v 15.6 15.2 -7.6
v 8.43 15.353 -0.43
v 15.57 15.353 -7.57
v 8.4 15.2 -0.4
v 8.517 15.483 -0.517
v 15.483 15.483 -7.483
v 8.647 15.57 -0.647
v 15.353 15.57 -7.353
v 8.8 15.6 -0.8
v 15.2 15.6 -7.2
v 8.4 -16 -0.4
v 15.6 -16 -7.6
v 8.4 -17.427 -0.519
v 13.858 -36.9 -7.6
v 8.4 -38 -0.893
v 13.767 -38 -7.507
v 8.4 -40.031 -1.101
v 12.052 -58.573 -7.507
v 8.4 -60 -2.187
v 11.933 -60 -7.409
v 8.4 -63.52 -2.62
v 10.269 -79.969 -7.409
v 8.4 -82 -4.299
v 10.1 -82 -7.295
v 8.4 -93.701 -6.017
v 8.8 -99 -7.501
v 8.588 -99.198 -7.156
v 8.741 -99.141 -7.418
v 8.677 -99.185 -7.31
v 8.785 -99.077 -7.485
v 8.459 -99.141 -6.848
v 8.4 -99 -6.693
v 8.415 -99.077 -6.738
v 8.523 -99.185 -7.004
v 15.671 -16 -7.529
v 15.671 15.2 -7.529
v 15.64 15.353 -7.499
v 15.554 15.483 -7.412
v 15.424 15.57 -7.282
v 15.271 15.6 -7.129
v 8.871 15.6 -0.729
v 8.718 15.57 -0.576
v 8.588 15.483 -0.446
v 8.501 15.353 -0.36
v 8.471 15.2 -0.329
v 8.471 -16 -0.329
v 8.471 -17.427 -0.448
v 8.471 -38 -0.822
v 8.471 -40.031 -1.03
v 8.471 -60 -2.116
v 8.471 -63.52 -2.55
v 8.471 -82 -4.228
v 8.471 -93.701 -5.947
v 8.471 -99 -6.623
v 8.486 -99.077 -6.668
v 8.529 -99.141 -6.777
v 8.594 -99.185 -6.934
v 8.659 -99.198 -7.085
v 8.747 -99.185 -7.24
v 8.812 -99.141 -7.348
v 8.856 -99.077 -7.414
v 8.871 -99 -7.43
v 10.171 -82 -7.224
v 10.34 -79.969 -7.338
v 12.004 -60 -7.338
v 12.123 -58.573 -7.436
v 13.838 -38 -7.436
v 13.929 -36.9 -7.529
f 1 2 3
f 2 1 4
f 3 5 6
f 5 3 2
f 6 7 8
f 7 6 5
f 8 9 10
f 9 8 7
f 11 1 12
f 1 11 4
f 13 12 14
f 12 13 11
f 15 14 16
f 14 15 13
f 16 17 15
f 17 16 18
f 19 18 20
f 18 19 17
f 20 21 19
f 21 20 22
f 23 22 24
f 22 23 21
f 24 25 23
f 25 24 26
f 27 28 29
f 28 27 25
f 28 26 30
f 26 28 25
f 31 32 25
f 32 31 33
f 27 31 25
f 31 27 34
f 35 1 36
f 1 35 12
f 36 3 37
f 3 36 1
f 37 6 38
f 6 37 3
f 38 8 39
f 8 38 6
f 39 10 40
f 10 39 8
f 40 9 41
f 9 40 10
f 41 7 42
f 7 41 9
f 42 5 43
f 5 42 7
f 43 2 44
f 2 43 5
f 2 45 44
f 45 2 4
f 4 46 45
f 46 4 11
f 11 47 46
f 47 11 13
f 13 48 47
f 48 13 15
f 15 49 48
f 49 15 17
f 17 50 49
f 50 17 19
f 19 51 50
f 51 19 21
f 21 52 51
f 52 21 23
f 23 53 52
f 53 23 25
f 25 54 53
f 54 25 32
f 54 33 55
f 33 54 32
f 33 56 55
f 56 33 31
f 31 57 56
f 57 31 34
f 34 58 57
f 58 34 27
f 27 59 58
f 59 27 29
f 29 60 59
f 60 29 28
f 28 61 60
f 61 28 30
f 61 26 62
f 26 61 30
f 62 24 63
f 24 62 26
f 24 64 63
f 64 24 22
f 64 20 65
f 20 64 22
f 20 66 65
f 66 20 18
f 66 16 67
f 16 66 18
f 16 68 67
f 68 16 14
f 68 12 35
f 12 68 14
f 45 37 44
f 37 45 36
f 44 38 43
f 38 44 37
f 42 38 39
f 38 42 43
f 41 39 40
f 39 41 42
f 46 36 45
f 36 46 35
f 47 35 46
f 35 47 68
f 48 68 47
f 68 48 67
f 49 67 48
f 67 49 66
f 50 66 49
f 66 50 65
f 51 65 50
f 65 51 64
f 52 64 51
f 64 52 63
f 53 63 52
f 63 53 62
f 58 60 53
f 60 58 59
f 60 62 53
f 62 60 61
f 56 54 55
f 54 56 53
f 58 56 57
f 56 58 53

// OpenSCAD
use <../lib.scad>
function ldraw_lib__6347356qc01() = [
// 0 Sticker  1.1 x 14.1 Triangular Left Dark Red (Formed)
// 0 Name: 6347356qc01.dat
// 0 Author: Evert-Jan Boer [ejboer]
// 0 !LDRAW_ORG Part UPDATE 2025-08
// 0 !LICENSE Licensed under CC BY 4.0 : see CAreadme.txt
// 
// 0 BFC CERTIFY CCW
  [0,"BFC","CERTIFY"],
  [0,"BFC","CCW"],
// 
// 0 !KEYWORDS BrickLink 75309stk01, Rebrickable 78793, Republic Gunship, Set 75309
// 0 !KEYWORDS Star Wars
// 
// 0 !HISTORY 2025-08-31 [OrionP] Official Update 2025-08
// 
// 4 16 21.0761 1.0761 38.3827 38.9239 18.9239 38.3827 39 19 38 21 1 38
  [4,16,21.0761,1.0761,38.3827,38.9239,18.9239,38.3827,39,19,38,21,1,38],
// 4 16 21.0761 1.0761 38.3827 21.2929 1.2929 38.7071 38.7071 18.7071 38.7071 38.9239 18.9239 38.3827
  [4,16,21.0761,1.0761,38.3827,21.2929,1.2929,38.7071,38.7071,18.7071,38.7071,38.9239,18.9239,38.3827],
// 4 16 38.7071 18.7071 38.7071 21.2929 1.2929 38.7071 21.6173 1.6173 38.9239 38.3827 18.3827 38.9239
  [4,16,38.7071,18.7071,38.7071,21.2929,1.2929,38.7071,21.6173,1.6173,38.9239,38.3827,18.3827,38.9239],
// 4 16 21.6173 1.6173 38.9239 22 2 39 38 18 39 38.3827 18.3827 38.9239
  [4,16,21.6173,1.6173,38.9239,22,2,39,38,18,39,38.3827,18.3827,38.9239],
// 4 16 39 19 -40 21 1 -40 21 1 38 39 19 38
  [4,16,39,19,-40,21,1,-40,21,1,38,39,19,38],
// 4 16 34.6462 19 -92.25 21 1.2973 -43.5675 21 1 -40 39 19 -40
  [4,16,34.6462,19,-92.25,21,1.2973,-43.5675,21,1,-40,39,19,-40],
// 4 16 34.417 18.7675 -95 21 2.2315 -95 21 1.2973 -43.5675 34.6462 19 -92.25
  [4,16,34.417,18.7675,-95,21,2.2315,-95,21,1.2973,-43.5675,34.6462,19,-92.25],
// 4 16 30.1303 18.7675 -146.4325 21 2.753 -100.0771 21 2.2315 -95 34.417 18.7675 -95
  [4,16,30.1303,18.7675,-146.4325,21,2.753,-100.0771,21,2.2315,-95,34.417,18.7675,-95],
// 4 16 21 2.753 -100.0771 30.1303 18.7675 -146.4325 29.833 18.522 -150 21 5.467 -150
  [4,16,21,2.753,-100.0771,30.1303,18.7675,-146.4325,29.833,18.522,-150,21,5.467,-150],
// 4 16 25.6731 18.522 -199.9229 21 6.5508 -158.8 21 5.467 -150 29.833 18.522 -150
  [4,16,25.6731,18.522,-199.9229,21,6.5508,-158.8,21,5.467,-150,29.833,18.522,-150],
// 4 16 25.25 18.2374 -205 21 10.7466 -205 21 6.5508 -158.8 25.6731 18.522 -199.9229
  [4,16,25.25,18.2374,-205,21,10.7466,-205,21,6.5508,-158.8,25.6731,18.522,-199.9229],
// 4 16 25.25 18.2374 -205 22 18.7518 -247.5 21 15.0434 -234.253 21 10.7466 -205
  [4,16,25.25,18.2374,-205,22,18.7518,-247.5,21,15.0434,-234.253,21,10.7466,-205],
// 4 16 21.8536 18.5456 -247.8536 21.6914 18.2756 -247.962 21.4697 17.8897 -247.994 21 15.0434 -234.253
  [4,16,21.8536,18.5456,-247.8536,21.6914,18.2756,-247.962,21.4697,17.8897,-247.994,21,15.0434,-234.253],
// 4 16 21.8536 18.5456 -247.8536 21 15.0434 -234.253 22 18.7518 -247.5 21.962 18.7128 -247.6913
  [4,16,21.8536,18.5456,-247.8536,21,15.0434,-234.253,22,18.7518,-247.5,21.962,18.7128,-247.6913],
// 4 16 21.1465 17.1193 -247.8536 21.0381 16.8462 -247.6913 21 16.7332 -247.5 21 15.0434 -234.253
  [4,16,21.1465,17.1193,-247.8536,21.0381,16.8462,-247.6913,21,16.7332,-247.5,21,15.0434,-234.253],
// 4 16 21.1465 17.1193 -247.8536 21 15.0434 -234.253 21.4697 17.8897 -247.994 21.3087 17.5106 -247.962
  [4,16,21.1465,17.1193,-247.8536,21,15.0434,-234.253,21.4697,17.8897,-247.994,21.3087,17.5106,-247.962],
// 4 16 39.1768 18.8232 -40 39 19 -40 39 19 38 39.1768 18.8232 38
  [4,16,39.1768,18.8232,-40,39,19,-40,39,19,38,39.1768,18.8232,38],
// 4 16 39 19 38 38.9239 18.9239 38.3827 39.1007 18.7471 38.3827 39.1768 18.8232 38
  [4,16,39,19,38,38.9239,18.9239,38.3827,39.1007,18.7471,38.3827,39.1768,18.8232,38],
// 4 16 38.9239 18.9239 38.3827 38.7071 18.7071 38.7071 38.8839 18.5303 38.7071 39.1007 18.7471 38.3827
  [4,16,38.9239,18.9239,38.3827,38.7071,18.7071,38.7071,38.8839,18.5303,38.7071,39.1007,18.7471,38.3827],
// 4 16 38.7071 18.7071 38.7071 38.3827 18.3827 38.9239 38.5595 18.2059 38.9239 38.8839 18.5303 38.7071
  [4,16,38.7071,18.7071,38.7071,38.3827,18.3827,38.9239,38.5595,18.2059,38.9239,38.8839,18.5303,38.7071],
// 4 16 38.3827 18.3827 38.9239 38 18 39 38.1768 17.8232 39 38.5595 18.2059 38.9239
  [4,16,38.3827,18.3827,38.9239,38,18,39,38.1768,17.8232,39,38.5595,18.2059,38.9239],
// 4 16 38.1768 17.8232 39 38 18 39 22 2 39 22.1768 1.8232 39
  [4,16,38.1768,17.8232,39,38,18,39,22,2,39,22.1768,1.8232,39],
// 4 16 22 2 39 21.6173 1.6173 38.9239 21.7941 1.4405 38.9239 22.1768 1.8232 39
  [4,16,22,2,39,21.6173,1.6173,38.9239,21.7941,1.4405,38.9239,22.1768,1.8232,39],
// 4 16 21.6173 1.6173 38.9239 21.2929 1.2929 38.7071 21.4697 1.1161 38.7071 21.7941 1.4405 38.9239
  [4,16,21.6173,1.6173,38.9239,21.2929,1.2929,38.7071,21.4697,1.1161,38.7071,21.7941,1.4405,38.9239],
// 4 16 21.2929 1.2929 38.7071 21.0761 1.0761 38.3827 21.2529 .8993 38.3827 21.4697 1.1161 38.7071
  [4,16,21.2929,1.2929,38.7071,21.0761,1.0761,38.3827,21.2529,.8993,38.3827,21.4697,1.1161,38.7071],
// 4 16 21.0761 1.0761 38.3827 21 1 38 21.1768 .8232 38 21.2529 .8993 38.3827
  [4,16,21.0761,1.0761,38.3827,21,1,38,21.1768,.8232,38,21.2529,.8993,38.3827],
// 4 16 21.1768 .8232 38 21 1 38 21 1 -40 21.1768 .8232 -40
  [4,16,21.1768,.8232,38,21,1,38,21,1,-40,21.1768,.8232,-40],
// 4 16 21.1768 .8232 -40 21 1 -40 21 1.2973 -43.5675 21.1768 1.1205 -43.5675
  [4,16,21.1768,.8232,-40,21,1,-40,21,1.2973,-43.5675,21.1768,1.1205,-43.5675],
// 4 16 21.1768 1.1205 -43.5675 21 1.2973 -43.5675 21 2.2315 -95 21.1768 2.0547 -95
  [4,16,21.1768,1.1205,-43.5675,21,1.2973,-43.5675,21,2.2315,-95,21.1768,2.0547,-95],
// 4 16 21.1768 2.0547 -95 21 2.2315 -95 21 2.753 -100.0771 21.1768 2.5762 -100.0771
  [4,16,21.1768,2.0547,-95,21,2.2315,-95,21,2.753,-100.0771,21.1768,2.5762,-100.0771],
// 4 16 21.1768 2.5762 -100.0771 21 2.753 -100.0771 21 5.467 -150 21.1768 5.2902 -150
  [4,16,21.1768,2.5762,-100.0771,21,2.753,-100.0771,21,5.467,-150,21.1768,5.2902,-150],
// 4 16 21.1768 5.2902 -150 21 5.467 -150 21 6.5508 -158.8 21.1768 6.374 -158.8
  [4,16,21.1768,5.2902,-150,21,5.467,-150,21,6.5508,-158.8,21.1768,6.374,-158.8],
// 4 16 21.1768 6.374 -158.8 21 6.5508 -158.8 21 10.7466 -205 21.1768 10.5698 -205
  [4,16,21.1768,6.374,-158.8,21,6.5508,-158.8,21,10.7466,-205,21.1768,10.5698,-205],
// 4 16 21.1768 10.5698 -205 21 10.7466 -205 21 15.0434 -234.253 21.1768 14.8666 -234.253
  [4,16,21.1768,10.5698,-205,21,10.7466,-205,21,15.0434,-234.253,21.1768,14.8666,-234.253],
// 4 16 21.1768 14.8666 -234.253 21 15.0434 -234.253 21 16.7332 -247.5 21.1768 16.5564 -247.5
  [4,16,21.1768,14.8666,-234.253,21,15.0434,-234.253,21,16.7332,-247.5,21.1768,16.5564,-247.5],
// 4 16 21.1768 16.5564 -247.5 21 16.7332 -247.5 21.0381 16.8462 -247.6913 21.2149 16.6694 -247.6913
  [4,16,21.1768,16.5564,-247.5,21,16.7332,-247.5,21.0381,16.8462,-247.6913,21.2149,16.6694,-247.6913],
// 4 16 21.2149 16.6694 -247.6913 21.0381 16.8462 -247.6913 21.1465 17.1193 -247.8536 21.3233 16.9425 -247.8536
  [4,16,21.2149,16.6694,-247.6913,21.0381,16.8462,-247.6913,21.1465,17.1193,-247.8536,21.3233,16.9425,-247.8536],
// 4 16 21.3233 16.9425 -247.8536 21.1465 17.1193 -247.8536 21.3087 17.5106 -247.962 21.4855 17.3338 -247.962
  [4,16,21.3233,16.9425,-247.8536,21.1465,17.1193,-247.8536,21.3087,17.5106,-247.962,21.4855,17.3338,-247.962],
// 4 16 21.4855 17.3338 -247.962 21.3087 17.5106 -247.962 21.4697 17.8897 -247.994 21.6465 17.7129 -247.994
  [4,16,21.4855,17.3338,-247.962,21.3087,17.5106,-247.962,21.4697,17.8897,-247.994,21.6465,17.7129,-247.994],
// 4 16 21.6465 17.7129 -247.994 21.4697 17.8897 -247.994 21.6914 18.2756 -247.962 21.8682 18.0988 -247.962
  [4,16,21.6465,17.7129,-247.994,21.4697,17.8897,-247.994,21.6914,18.2756,-247.962,21.8682,18.0988,-247.962],
// 4 16 21.8682 18.0988 -247.962 21.6914 18.2756 -247.962 21.8536 18.5456 -247.8536 22.0304 18.3688 -247.8536
  [4,16,21.8682,18.0988,-247.962,21.6914,18.2756,-247.962,21.8536,18.5456,-247.8536,22.0304,18.3688,-247.8536],
// 4 16 22.0304 18.3688 -247.8536 21.8536 18.5456 -247.8536 21.962 18.7128 -247.6913 22.1388 18.536 -247.6913
  [4,16,22.0304,18.3688,-247.8536,21.8536,18.5456,-247.8536,21.962,18.7128,-247.6913,22.1388,18.536,-247.6913],
// 4 16 22.1388 18.536 -247.6913 21.962 18.7128 -247.6913 22 18.7518 -247.5 22.1768 18.575 -247.5
  [4,16,22.1388,18.536,-247.6913,21.962,18.7128,-247.6913,22,18.7518,-247.5,22.1768,18.575,-247.5],
// 4 16 22.1768 18.575 -247.5 22 18.7518 -247.5 25.25 18.2374 -205 25.4268 18.0606 -205
  [4,16,22.1768,18.575,-247.5,22,18.7518,-247.5,25.25,18.2374,-205,25.4268,18.0606,-205],
// 4 16 25.4268 18.0606 -205 25.25 18.2374 -205 25.6731 18.522 -199.9229 25.8499 18.3452 -199.9229
  [4,16,25.4268,18.0606,-205,25.25,18.2374,-205,25.6731,18.522,-199.9229,25.8499,18.3452,-199.9229],
// 4 16 25.8499 18.3452 -199.9229 25.6731 18.522 -199.9229 29.833 18.522 -150 30.0098 18.3452 -150
  [4,16,25.8499,18.3452,-199.9229,25.6731,18.522,-199.9229,29.833,18.522,-150,30.0098,18.3452,-150],
// 4 16 30.0098 18.3452 -150 29.833 18.522 -150 30.1303 18.7675 -146.4325 30.3071 18.5907 -146.4325
  [4,16,30.0098,18.3452,-150,29.833,18.522,-150,30.1303,18.7675,-146.4325,30.3071,18.5907,-146.4325],
// 4 16 30.3071 18.5907 -146.4325 30.1303 18.7675 -146.4325 34.417 18.7675 -95 34.5938 18.5907 -95
  [4,16,30.3071,18.5907,-146.4325,30.1303,18.7675,-146.4325,34.417,18.7675,-95,34.5938,18.5907,-95],
// 4 16 34.5938 18.5907 -95 34.417 18.7675 -95 34.6462 19 -92.25 34.823 18.8232 -92.25
  [4,16,34.5938,18.5907,-95,34.417,18.7675,-95,34.6462,19,-92.25,34.823,18.8232,-92.25],
// 4 16 34.823 18.8232 -92.25 34.6462 19 -92.25 39 19 -40 39.1768 18.8232 -40
  [4,16,34.823,18.8232,-92.25,34.6462,19,-92.25,39,19,-40,39.1768,18.8232,-40],
// 5 24 34.5938 18.5907 -95 21.1768 2.0547 -95 21.1768 2.5762 -100.0771 34.823 18.8232 -92.25
  [5,24,34.5938,18.5907,-95,21.1768,2.0547,-95,21.1768,2.5762,-100.0771,34.823,18.8232,-92.25],
// 5 24 25.25 18.2374 -205 21 10.7466 -205 21 6.5508 -158.8 22 18.7518 -247.5
  [5,24,25.25,18.2374,-205,21,10.7466,-205,21,6.5508,-158.8,22,18.7518,-247.5],
// 5 24 34.417 18.7675 -95 21 2.2315 -95 30.1303 18.7675 -146.4325 21 1.2973 -43.5675
  [5,24,34.417,18.7675,-95,21,2.2315,-95,30.1303,18.7675,-146.4325,21,1.2973,-43.5675],
// 5 24 34.6462 19 -92.25 21 1.2973 -43.5675 34.417 18.7675 -95 21 1 -40
  [5,24,34.6462,19,-92.25,21,1.2973,-43.5675,34.417,18.7675,-95,21,1,-40],
// 5 24 25.8499 18.3452 -199.9229 21.1768 6.374 -158.8 30.0098 18.3452 -150 21.1768 10.5698 -205
  [5,24,25.8499,18.3452,-199.9229,21.1768,6.374,-158.8,30.0098,18.3452,-150,21.1768,10.5698,-205],
// 5 24 21 2.753 -100.0771 30.1303 18.7675 -146.4325 21 2.2315 -95 29.833 18.522 -150
  [5,24,21,2.753,-100.0771,30.1303,18.7675,-146.4325,21,2.2315,-95,29.833,18.522,-150],
// 5 24 34.823 18.8232 -92.25 21.1768 1.1205 -43.5675 39.1768 18.8232 -40 21.1768 2.0547 -95
  [5,24,34.823,18.8232,-92.25,21.1768,1.1205,-43.5675,39.1768,18.8232,-40,21.1768,2.0547,-95],
// 5 24 29.833 18.522 -150 21 5.467 -150 21 2.753 -100.0771 25.6731 18.522 -199.9229
  [5,24,29.833,18.522,-150,21,5.467,-150,21,2.753,-100.0771,25.6731,18.522,-199.9229],
// 5 24 30.0098 18.3452 -150 21.1768 5.2902 -150 30.3071 18.5907 -146.4325 21.1768 6.374 -158.8
  [5,24,30.0098,18.3452,-150,21.1768,5.2902,-150,30.3071,18.5907,-146.4325,21.1768,6.374,-158.8],
// 5 24 30.3071 18.5907 -146.4325 21.1768 2.5762 -100.0771 21.1768 5.2902 -150 34.5938 18.5907 -95
  [5,24,30.3071,18.5907,-146.4325,21.1768,2.5762,-100.0771,21.1768,5.2902,-150,34.5938,18.5907,-95],
// 5 24 25.6731 18.522 -199.9229 21 6.5508 -158.8 25.25 18.2374 -205 21 5.467 -150
  [5,24,25.6731,18.522,-199.9229,21,6.5508,-158.8,25.25,18.2374,-205,21,5.467,-150],
// 5 24 25.4268 18.0606 -205 21.1768 10.5698 -205 21.1768 14.8666 -234.253 25.8499 18.3452 -199.9229
  [5,24,25.4268,18.0606,-205,21.1768,10.5698,-205,21.1768,14.8666,-234.253,25.8499,18.3452,-199.9229],
// 5 24 39 19 -40 21 1 -40 34.6462 19 -92.25 21 1 38
  [5,24,39,19,-40,21,1,-40,34.6462,19,-92.25,21,1,38],
// 5 24 39.1768 18.8232 -40 21.1768 .8232 -40 39.1768 18.8232 38 21.1768 1.1205 -43.5675
  [5,24,39.1768,18.8232,-40,21.1768,.8232,-40,39.1768,18.8232,38,21.1768,1.1205,-43.5675],
// 5 24 39.1768 18.8232 -40 39 19 -40 34.823 18.8232 -92.25 39 19 38
  [5,24,39.1768,18.8232,-40,39,19,-40,34.823,18.8232,-92.25,39,19,38],
// 5 24 39 19 38 39.1768 18.8232 38 39.1768 18.8232 -40 38.9239 18.9239 38.3827
  [5,24,39,19,38,39.1768,18.8232,38,39.1768,18.8232,-40,38.9239,18.9239,38.3827],
// 5 24 21 1 -40 21.1768 .8232 -40 21 1.2973 -43.5675 21.1768 .8232 38
  [5,24,21,1,-40,21.1768,.8232,-40,21,1.2973,-43.5675,21.1768,.8232,38],
// 5 24 34.417 18.7675 -95 34.5938 18.5907 -95 30.3071 18.5907 -146.4325 34.6462 19 -92.25
  [5,24,34.417,18.7675,-95,34.5938,18.5907,-95,30.3071,18.5907,-146.4325,34.6462,19,-92.25],
// 5 24 21.0381 16.8462 -247.6913 21.2149 16.6694 -247.6913 21.1768 16.5564 -247.5 21.1465 17.1193 -247.8536
  [5,24,21.0381,16.8462,-247.6913,21.2149,16.6694,-247.6913,21.1768,16.5564,-247.5,21.1465,17.1193,-247.8536],
// 5 24 21 2.753 -100.0771 21.1768 2.5762 -100.0771 21.1768 2.0547 -95 21 5.467 -150
  [5,24,21,2.753,-100.0771,21.1768,2.5762,-100.0771,21.1768,2.0547,-95,21,5.467,-150],
// 5 24 21 15.0434 -234.253 21.1768 14.8666 -234.253 21.1768 10.5698 -205 21 16.7332 -247.5
  [5,24,21,15.0434,-234.253,21.1768,14.8666,-234.253,21.1768,10.5698,-205,21,16.7332,-247.5],
// 5 24 38 18 39 38.1768 17.8232 39 38.5595 18.2059 38.9239 22 2 39
  [5,24,38,18,39,38.1768,17.8232,39,38.5595,18.2059,38.9239,22,2,39],
// 5 24 21 16.7332 -247.5 21.1768 16.5564 -247.5 21.1768 14.8666 -234.253 21.0381 16.8462 -247.6913
  [5,24,21,16.7332,-247.5,21.1768,16.5564,-247.5,21.1768,14.8666,-234.253,21.0381,16.8462,-247.6913],
// 5 24 38.9239 18.9239 38.3827 39.1007 18.7471 38.3827 39.1768 18.8232 38 38.7071 18.7071 38.7071
  [5,24,38.9239,18.9239,38.3827,39.1007,18.7471,38.3827,39.1768,18.8232,38,38.7071,18.7071,38.7071],
// 5 24 29.833 18.522 -150 30.0098 18.3452 -150 25.8499 18.3452 -199.9229 30.1303 18.7675 -146.4325
  [5,24,29.833,18.522,-150,30.0098,18.3452,-150,25.8499,18.3452,-199.9229,30.1303,18.7675,-146.4325],
// 5 24 25.25 18.2374 -205 25.4268 18.0606 -205 22.1768 18.575 -247.5 25.6731 18.522 -199.9229
  [5,24,25.25,18.2374,-205,25.4268,18.0606,-205,22.1768,18.575,-247.5,25.6731,18.522,-199.9229],
// 5 24 21 1.2973 -43.5675 21.1768 1.1205 -43.5675 21 2.2315 -95 21.1768 .8232 -40
  [5,24,21,1.2973,-43.5675,21.1768,1.1205,-43.5675,21,2.2315,-95,21.1768,.8232,-40],
// 5 24 21.2929 1.2929 38.7071 21.4697 1.1161 38.7071 21.7941 1.4405 38.9239 21.0761 1.0761 38.3827
  [5,24,21.2929,1.2929,38.7071,21.4697,1.1161,38.7071,21.7941,1.4405,38.9239,21.0761,1.0761,38.3827],
// 5 24 21 2.2315 -95 21.1768 2.0547 -95 21.1768 1.1205 -43.5675 21 2.753 -100.0771
  [5,24,21,2.2315,-95,21.1768,2.0547,-95,21.1768,1.1205,-43.5675,21,2.753,-100.0771],
// 5 24 21.962 18.7128 -247.6913 22.1388 18.536 -247.6913 22 18.7518 -247.5 22.0304 18.3688 -247.8536
  [5,24,21.962,18.7128,-247.6913,22.1388,18.536,-247.6913,22,18.7518,-247.5,22.0304,18.3688,-247.8536],
// 5 24 22 18.7518 -247.5 22.1768 18.575 -247.5 25.25 18.2374 -205 22.1388 18.536 -247.6913
  [5,24,22,18.7518,-247.5,22.1768,18.575,-247.5,25.25,18.2374,-205,22.1388,18.536,-247.6913],
// 5 24 21.6173 1.6173 38.9239 21.7941 1.4405 38.9239 22.1768 1.8232 39 21.2929 1.2929 38.7071
  [5,24,21.6173,1.6173,38.9239,21.7941,1.4405,38.9239,22.1768,1.8232,39,21.2929,1.2929,38.7071],
// 5 24 25.6731 18.522 -199.9229 25.8499 18.3452 -199.9229 25.4268 18.0606 -205 29.833 18.522 -150
  [5,24,25.6731,18.522,-199.9229,25.8499,18.3452,-199.9229,25.4268,18.0606,-205,29.833,18.522,-150],
// 5 24 38.3827 18.3827 38.9239 38.5595 18.2059 38.9239 38.8839 18.5303 38.7071 38 18 39
  [5,24,38.3827,18.3827,38.9239,38.5595,18.2059,38.9239,38.8839,18.5303,38.7071,38,18,39],
// 5 24 21 1 38 21.1768 .8232 38 21 1 -40 21.2529 .8993 38.3827
  [5,24,21,1,38,21.1768,.8232,38,21,1,-40,21.2529,.8993,38.3827],
// 5 24 22 2 39 22.1768 1.8232 39 38.1768 17.8232 39 21.6173 1.6173 38.9239
  [5,24,22,2,39,22.1768,1.8232,39,38.1768,17.8232,39,21.6173,1.6173,38.9239],
// 5 24 38.7071 18.7071 38.7071 38.8839 18.5303 38.7071 39.1007 18.7471 38.3827 38.3827 18.3827 38.9239
  [5,24,38.7071,18.7071,38.7071,38.8839,18.5303,38.7071,39.1007,18.7471,38.3827,38.3827,18.3827,38.9239],
// 5 24 21 10.7466 -205 21.1768 10.5698 -205 21.1768 6.374 -158.8 21 15.0434 -234.253
  [5,24,21,10.7466,-205,21.1768,10.5698,-205,21.1768,6.374,-158.8,21,15.0434,-234.253],
// 5 24 21.0761 1.0761 38.3827 21.2529 .8993 38.3827 21.4697 1.1161 38.7071 21 1 38
  [5,24,21.0761,1.0761,38.3827,21.2529,.8993,38.3827,21.4697,1.1161,38.7071,21,1,38],
// 5 24 21.8536 18.5456 -247.8536 22.0304 18.3688 -247.8536 21.8682 18.0988 -247.962 21.962 18.7128 -247.6913
  [5,24,21.8536,18.5456,-247.8536,22.0304,18.3688,-247.8536,21.8682,18.0988,-247.962,21.962,18.7128,-247.6913],
// 5 24 21.1465 17.1193 -247.8536 21.3233 16.9425 -247.8536 21.2149 16.6694 -247.6913 21.3087 17.5106 -247.962
  [5,24,21.1465,17.1193,-247.8536,21.3233,16.9425,-247.8536,21.2149,16.6694,-247.6913,21.3087,17.5106,-247.962],
// 5 24 21.3087 17.5106 -247.962 21.4855 17.3338 -247.962 21.3233 16.9425 -247.8536 21.4697 17.8897 -247.994
  [5,24,21.3087,17.5106,-247.962,21.4855,17.3338,-247.962,21.3233,16.9425,-247.8536,21.4697,17.8897,-247.994],
// 5 24 30.1303 18.7675 -146.4325 30.3071 18.5907 -146.4325 30.0098 18.3452 -150 34.417 18.7675 -95
  [5,24,30.1303,18.7675,-146.4325,30.3071,18.5907,-146.4325,30.0098,18.3452,-150,34.417,18.7675,-95],
// 5 24 34.6462 19 -92.25 34.823 18.8232 -92.25 34.5938 18.5907 -95 39 19 -40
  [5,24,34.6462,19,-92.25,34.823,18.8232,-92.25,34.5938,18.5907,-95,39,19,-40],
// 5 24 21 5.467 -150 21.1768 5.2902 -150 21.1768 2.5762 -100.0771 21 6.5508 -158.8
  [5,24,21,5.467,-150,21.1768,5.2902,-150,21.1768,2.5762,-100.0771,21,6.5508,-158.8],
// 5 24 21 6.5508 -158.8 21.1768 6.374 -158.8 21.1768 5.2902 -150 21 10.7466 -205
  [5,24,21,6.5508,-158.8,21.1768,6.374,-158.8,21.1768,5.2902,-150,21,10.7466,-205],
// 5 24 21.4697 17.8897 -247.994 21.6465 17.7129 -247.994 21.4855 17.3338 -247.962 21.6914 18.2756 -247.962
  [5,24,21.4697,17.8897,-247.994,21.6465,17.7129,-247.994,21.4855,17.3338,-247.962,21.6914,18.2756,-247.962],
// 5 24 21.6914 18.2756 -247.962 21.8682 18.0988 -247.962 21.6465 17.7129 -247.994 21.8536 18.5456 -247.8536
  [5,24,21.6914,18.2756,-247.962,21.8682,18.0988,-247.962,21.6465,17.7129,-247.994,21.8536,18.5456,-247.8536],
// 5 24 21.4697 17.8897 -247.994 21 15.0434 -234.253 21.8536 18.5456 -247.8536 21.3087 17.5106 -247.962
  [5,24,21.4697,17.8897,-247.994,21,15.0434,-234.253,21.8536,18.5456,-247.8536,21.3087,17.5106,-247.962],
// 5 24 21.6465 17.7129 -247.994 21.1768 14.8666 -234.253 21.3233 16.9425 -247.8536 21.8682 18.0988 -247.962
  [5,24,21.6465,17.7129,-247.994,21.1768,14.8666,-234.253,21.3233,16.9425,-247.8536,21.8682,18.0988,-247.962],
// 
// 0 BFC NOCLIP
  [0,"BFC","NOCLIP"],
// 4 320 39.1768 18.8232 38 39.1007 18.7471 38.3827 21.2529 .8993 38.3827 21.1768 .8232 38
  [4,320,39.1768,18.8232,38,39.1007,18.7471,38.3827,21.2529,.8993,38.3827,21.1768,.8232,38],
// 4 320 38.8839 18.5303 38.7071 21.4697 1.1161 38.7071 21.2529 .8993 38.3827 39.1007 18.7471 38.3827
  [4,320,38.8839,18.5303,38.7071,21.4697,1.1161,38.7071,21.2529,.8993,38.3827,39.1007,18.7471,38.3827],
// 4 320 21.7941 1.4405 38.9239 21.4697 1.1161 38.7071 38.8839 18.5303 38.7071 38.5595 18.2059 38.9239
  [4,320,21.7941,1.4405,38.9239,21.4697,1.1161,38.7071,38.8839,18.5303,38.7071,38.5595,18.2059,38.9239],
// 4 320 38.1768 17.8232 39 22.1768 1.8232 39 21.7941 1.4405 38.9239 38.5595 18.2059 38.9239
  [4,320,38.1768,17.8232,39,22.1768,1.8232,39,21.7941,1.4405,38.9239,38.5595,18.2059,38.9239],
// 4 320 21.1768 .8232 38 21.1768 .8232 -40 39.1768 18.8232 -40 39.1768 18.8232 38
  [4,320,21.1768,.8232,38,21.1768,.8232,-40,39.1768,18.8232,-40,39.1768,18.8232,38],
// 4 320 21.1768 .8232 -40 21.1768 1.1205 -43.5675 34.823 18.8232 -92.25 39.1768 18.8232 -40
  [4,320,21.1768,.8232,-40,21.1768,1.1205,-43.5675,34.823,18.8232,-92.25,39.1768,18.8232,-40],
// 4 320 21.1768 1.1205 -43.5675 21.1768 2.0547 -95 34.5938 18.5907 -95 34.823 18.8232 -92.25
  [4,320,21.1768,1.1205,-43.5675,21.1768,2.0547,-95,34.5938,18.5907,-95,34.823,18.8232,-92.25],
// 4 320 21.1768 2.0547 -95 21.1768 2.5762 -100.0771 30.3071 18.5907 -146.4325 34.5938 18.5907 -95
  [4,320,21.1768,2.0547,-95,21.1768,2.5762,-100.0771,30.3071,18.5907,-146.4325,34.5938,18.5907,-95],
// 4 320 30.0098 18.3452 -150 30.3071 18.5907 -146.4325 21.1768 2.5762 -100.0771 21.1768 5.2902 -150
  [4,320,30.0098,18.3452,-150,30.3071,18.5907,-146.4325,21.1768,2.5762,-100.0771,21.1768,5.2902,-150],
// 4 320 21.1768 5.2902 -150 21.1768 6.374 -158.8 25.8499 18.3452 -199.9229 30.0098 18.3452 -150
  [4,320,21.1768,5.2902,-150,21.1768,6.374,-158.8,25.8499,18.3452,-199.9229,30.0098,18.3452,-150],
// 4 320 21.1768 6.374 -158.8 21.1768 10.5698 -205 25.4268 18.0606 -205 25.8499 18.3452 -199.9229
  [4,320,21.1768,6.374,-158.8,21.1768,10.5698,-205,25.4268,18.0606,-205,25.8499,18.3452,-199.9229],
// 4 320 21.1768 14.8666 -234.253 22.1768 18.575 -247.5 25.4268 18.0606 -205 21.1768 10.5698 -205
  [4,320,21.1768,14.8666,-234.253,22.1768,18.575,-247.5,25.4268,18.0606,-205,21.1768,10.5698,-205],
// 4 320 21.6465 17.7129 -247.994 21.8682 18.0988 -247.962 22.0304 18.3688 -247.8536 21.1768 14.8666 -234.253
  [4,320,21.6465,17.7129,-247.994,21.8682,18.0988,-247.962,22.0304,18.3688,-247.8536,21.1768,14.8666,-234.253],
// 4 320 22.1768 18.575 -247.5 21.1768 14.8666 -234.253 22.0304 18.3688 -247.8536 22.1388 18.536 -247.6913
  [4,320,22.1768,18.575,-247.5,21.1768,14.8666,-234.253,22.0304,18.3688,-247.8536,22.1388,18.536,-247.6913],
// 4 320 21.1768 16.5564 -247.5 21.2149 16.6694 -247.6913 21.3233 16.9425 -247.8536 21.1768 14.8666 -234.253
  [4,320,21.1768,16.5564,-247.5,21.2149,16.6694,-247.6913,21.3233,16.9425,-247.8536,21.1768,14.8666,-234.253],
// 4 320 21.6465 17.7129 -247.994 21.1768 14.8666 -234.253 21.3233 16.9425 -247.8536 21.4855 17.3338 -247.962
  [4,320,21.6465,17.7129,-247.994,21.1768,14.8666,-234.253,21.3233,16.9425,-247.8536,21.4855,17.3338,-247.962],
];
module ldraw_lib__6347356qc01(step=0, col=false, unit=2/5, alt=false, line=0.2, solid=!$preview)
    makepoly(ldraw_lib__6347356qc01(), step=step, col=col, unit=unit, alt=alt, line=line, solid=solid);
ldraw_lib__6347356qc01(line=0.2);
